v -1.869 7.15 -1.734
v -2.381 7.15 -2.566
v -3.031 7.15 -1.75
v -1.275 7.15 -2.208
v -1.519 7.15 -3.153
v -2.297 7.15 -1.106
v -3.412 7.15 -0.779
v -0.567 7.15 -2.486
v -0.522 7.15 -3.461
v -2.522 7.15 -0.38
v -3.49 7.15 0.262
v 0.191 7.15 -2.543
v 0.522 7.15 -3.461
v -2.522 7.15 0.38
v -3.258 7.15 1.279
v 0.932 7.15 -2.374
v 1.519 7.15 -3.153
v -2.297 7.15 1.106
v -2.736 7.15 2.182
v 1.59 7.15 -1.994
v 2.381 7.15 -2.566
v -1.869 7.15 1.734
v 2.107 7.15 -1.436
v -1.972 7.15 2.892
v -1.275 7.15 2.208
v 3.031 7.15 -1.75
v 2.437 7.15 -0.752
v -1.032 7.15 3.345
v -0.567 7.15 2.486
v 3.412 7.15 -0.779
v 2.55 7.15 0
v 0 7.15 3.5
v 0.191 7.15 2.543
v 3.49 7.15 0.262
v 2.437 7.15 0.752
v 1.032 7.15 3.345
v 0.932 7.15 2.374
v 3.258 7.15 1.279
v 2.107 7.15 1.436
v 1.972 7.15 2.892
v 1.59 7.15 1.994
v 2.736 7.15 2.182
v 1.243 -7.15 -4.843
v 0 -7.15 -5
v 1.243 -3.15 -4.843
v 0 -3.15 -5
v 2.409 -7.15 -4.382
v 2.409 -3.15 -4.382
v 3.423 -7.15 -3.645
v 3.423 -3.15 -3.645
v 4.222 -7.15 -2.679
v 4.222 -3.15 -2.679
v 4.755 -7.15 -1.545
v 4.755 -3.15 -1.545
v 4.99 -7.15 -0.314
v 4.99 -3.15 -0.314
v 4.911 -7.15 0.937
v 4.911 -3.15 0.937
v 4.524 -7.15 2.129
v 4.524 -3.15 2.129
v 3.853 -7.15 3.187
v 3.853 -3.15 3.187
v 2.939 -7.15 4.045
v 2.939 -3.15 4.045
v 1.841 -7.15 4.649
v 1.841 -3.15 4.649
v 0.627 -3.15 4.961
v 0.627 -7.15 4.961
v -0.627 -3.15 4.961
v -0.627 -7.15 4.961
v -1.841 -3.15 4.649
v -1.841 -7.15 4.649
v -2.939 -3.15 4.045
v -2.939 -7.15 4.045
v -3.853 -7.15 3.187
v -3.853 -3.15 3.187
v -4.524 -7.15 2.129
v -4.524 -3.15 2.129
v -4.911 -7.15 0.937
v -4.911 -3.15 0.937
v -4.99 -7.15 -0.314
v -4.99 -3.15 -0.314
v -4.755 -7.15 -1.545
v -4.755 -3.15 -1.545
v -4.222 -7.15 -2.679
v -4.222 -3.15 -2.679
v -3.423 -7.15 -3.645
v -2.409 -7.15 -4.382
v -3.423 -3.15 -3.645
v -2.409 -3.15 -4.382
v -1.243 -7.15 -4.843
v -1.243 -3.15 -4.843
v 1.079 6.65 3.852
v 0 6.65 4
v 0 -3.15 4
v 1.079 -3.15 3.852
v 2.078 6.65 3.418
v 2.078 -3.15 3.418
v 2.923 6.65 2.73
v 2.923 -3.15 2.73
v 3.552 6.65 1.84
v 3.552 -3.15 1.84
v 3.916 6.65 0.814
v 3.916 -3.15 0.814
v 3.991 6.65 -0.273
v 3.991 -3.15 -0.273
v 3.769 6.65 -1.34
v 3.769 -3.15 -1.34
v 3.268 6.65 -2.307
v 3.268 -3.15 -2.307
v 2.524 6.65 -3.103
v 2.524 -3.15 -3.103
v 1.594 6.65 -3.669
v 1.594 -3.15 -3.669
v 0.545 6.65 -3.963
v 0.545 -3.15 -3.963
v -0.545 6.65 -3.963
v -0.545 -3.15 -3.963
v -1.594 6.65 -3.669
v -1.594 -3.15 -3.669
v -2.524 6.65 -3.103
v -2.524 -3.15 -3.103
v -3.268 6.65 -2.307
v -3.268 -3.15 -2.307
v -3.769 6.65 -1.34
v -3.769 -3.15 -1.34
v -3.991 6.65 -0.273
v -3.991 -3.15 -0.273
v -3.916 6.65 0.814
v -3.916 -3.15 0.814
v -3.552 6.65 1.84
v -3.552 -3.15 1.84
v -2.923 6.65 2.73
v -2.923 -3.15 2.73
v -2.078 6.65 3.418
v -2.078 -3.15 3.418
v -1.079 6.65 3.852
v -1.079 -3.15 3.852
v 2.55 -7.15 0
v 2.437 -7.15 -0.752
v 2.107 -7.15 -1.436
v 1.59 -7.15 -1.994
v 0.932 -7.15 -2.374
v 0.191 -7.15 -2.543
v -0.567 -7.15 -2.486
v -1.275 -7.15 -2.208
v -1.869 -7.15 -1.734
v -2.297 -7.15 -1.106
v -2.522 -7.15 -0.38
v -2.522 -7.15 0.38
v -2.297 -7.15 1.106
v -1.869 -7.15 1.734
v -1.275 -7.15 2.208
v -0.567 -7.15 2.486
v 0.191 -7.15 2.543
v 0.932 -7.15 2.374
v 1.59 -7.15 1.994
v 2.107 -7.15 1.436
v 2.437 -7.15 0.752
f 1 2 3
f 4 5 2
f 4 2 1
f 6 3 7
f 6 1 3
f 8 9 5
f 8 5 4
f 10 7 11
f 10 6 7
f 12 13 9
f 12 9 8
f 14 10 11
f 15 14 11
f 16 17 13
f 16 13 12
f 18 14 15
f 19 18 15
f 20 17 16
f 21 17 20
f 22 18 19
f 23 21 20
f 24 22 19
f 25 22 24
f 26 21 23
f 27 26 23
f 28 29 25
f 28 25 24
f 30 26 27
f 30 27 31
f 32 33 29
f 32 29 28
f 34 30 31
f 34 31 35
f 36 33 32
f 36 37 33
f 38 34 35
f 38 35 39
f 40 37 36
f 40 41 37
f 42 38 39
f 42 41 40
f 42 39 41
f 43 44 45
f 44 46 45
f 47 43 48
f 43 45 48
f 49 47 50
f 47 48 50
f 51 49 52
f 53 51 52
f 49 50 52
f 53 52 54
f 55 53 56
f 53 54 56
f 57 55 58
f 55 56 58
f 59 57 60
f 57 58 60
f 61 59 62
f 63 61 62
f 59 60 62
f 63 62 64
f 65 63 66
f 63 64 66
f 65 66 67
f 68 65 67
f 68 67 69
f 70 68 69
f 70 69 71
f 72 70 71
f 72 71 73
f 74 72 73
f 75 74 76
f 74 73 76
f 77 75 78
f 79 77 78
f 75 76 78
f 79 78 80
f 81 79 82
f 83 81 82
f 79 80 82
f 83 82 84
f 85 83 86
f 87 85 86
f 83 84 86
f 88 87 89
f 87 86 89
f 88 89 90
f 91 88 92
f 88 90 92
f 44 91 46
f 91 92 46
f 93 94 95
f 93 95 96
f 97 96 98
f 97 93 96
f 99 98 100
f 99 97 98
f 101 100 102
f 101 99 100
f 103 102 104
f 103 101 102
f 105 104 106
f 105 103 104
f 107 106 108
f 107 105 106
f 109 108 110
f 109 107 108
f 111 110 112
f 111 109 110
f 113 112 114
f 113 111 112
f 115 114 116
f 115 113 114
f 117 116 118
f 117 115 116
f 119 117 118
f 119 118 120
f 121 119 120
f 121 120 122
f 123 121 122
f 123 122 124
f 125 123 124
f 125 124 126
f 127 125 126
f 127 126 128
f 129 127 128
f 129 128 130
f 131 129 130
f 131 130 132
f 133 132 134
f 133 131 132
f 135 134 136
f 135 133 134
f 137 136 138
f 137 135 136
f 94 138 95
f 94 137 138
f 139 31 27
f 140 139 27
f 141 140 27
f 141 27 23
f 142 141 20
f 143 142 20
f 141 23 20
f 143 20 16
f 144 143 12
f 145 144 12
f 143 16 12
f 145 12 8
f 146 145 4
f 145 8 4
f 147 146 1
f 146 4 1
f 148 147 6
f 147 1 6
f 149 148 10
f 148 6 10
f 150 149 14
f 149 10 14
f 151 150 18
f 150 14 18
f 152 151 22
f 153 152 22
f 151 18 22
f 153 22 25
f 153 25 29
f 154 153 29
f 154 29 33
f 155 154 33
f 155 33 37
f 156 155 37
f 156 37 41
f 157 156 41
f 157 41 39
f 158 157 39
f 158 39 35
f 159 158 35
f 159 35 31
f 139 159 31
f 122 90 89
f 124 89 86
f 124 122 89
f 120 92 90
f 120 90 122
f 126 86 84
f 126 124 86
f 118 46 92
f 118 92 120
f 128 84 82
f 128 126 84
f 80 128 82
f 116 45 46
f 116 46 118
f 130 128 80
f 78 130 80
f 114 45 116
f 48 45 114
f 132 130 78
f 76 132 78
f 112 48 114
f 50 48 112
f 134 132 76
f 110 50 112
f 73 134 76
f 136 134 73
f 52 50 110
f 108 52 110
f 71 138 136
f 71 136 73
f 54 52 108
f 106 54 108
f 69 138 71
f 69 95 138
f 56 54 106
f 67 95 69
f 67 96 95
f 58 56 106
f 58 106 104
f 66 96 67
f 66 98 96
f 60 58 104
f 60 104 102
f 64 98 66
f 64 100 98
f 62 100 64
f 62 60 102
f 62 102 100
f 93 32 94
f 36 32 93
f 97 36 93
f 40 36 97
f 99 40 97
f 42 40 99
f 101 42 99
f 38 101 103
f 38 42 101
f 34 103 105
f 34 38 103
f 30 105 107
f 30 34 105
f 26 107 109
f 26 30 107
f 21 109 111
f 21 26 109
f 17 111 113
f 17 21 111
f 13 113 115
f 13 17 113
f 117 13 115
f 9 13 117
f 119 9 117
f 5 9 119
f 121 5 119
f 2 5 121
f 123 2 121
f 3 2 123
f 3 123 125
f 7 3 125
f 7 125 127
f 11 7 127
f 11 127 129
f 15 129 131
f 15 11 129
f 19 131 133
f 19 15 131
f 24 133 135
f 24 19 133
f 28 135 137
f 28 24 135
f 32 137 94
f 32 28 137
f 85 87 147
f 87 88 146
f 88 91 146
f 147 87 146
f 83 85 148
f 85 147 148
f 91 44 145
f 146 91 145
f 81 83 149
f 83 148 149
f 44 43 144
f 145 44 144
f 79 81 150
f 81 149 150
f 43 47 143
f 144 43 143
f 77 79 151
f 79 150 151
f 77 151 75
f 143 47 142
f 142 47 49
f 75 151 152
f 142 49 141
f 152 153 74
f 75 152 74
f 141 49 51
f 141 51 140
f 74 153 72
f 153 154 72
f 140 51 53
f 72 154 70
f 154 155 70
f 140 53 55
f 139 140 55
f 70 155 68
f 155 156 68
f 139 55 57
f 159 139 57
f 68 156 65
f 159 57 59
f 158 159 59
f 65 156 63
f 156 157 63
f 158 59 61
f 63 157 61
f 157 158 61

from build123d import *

# Parameters (mm, degrees)
SKETCH_1_R              = 4
EXTRUDE_1_DEPTH         = 7.15
SKETCH_2_W              = 1
SKETCH_2_H              = 4
CHAMFER_1_SIZE          = 0.5
HOLE_WIZARD_5_1_5_1_1_D = 5.1


with BuildPart() as part:
    # 草图1 → 凸台-拉伸1 (new, symmetric)
    with BuildSketch(Plane(origin=(0, 0, 0), x_dir=(1, 0, 0), z_dir=(0, 1, 0))):
        with Locations(Location((0, 0, 0), (0, 0, 270))):
            Circle(SKETCH_1_R)
    extrude(amount=EXTRUDE_1_DEPTH, both=True)

    # 草图2 → 旋转1 (revolve)
    with BuildSketch(Plane.XY, mode=Mode.PRIVATE) as revolve_1_sk:
        with Locations((4.5, -5.15)):
            Rectangle(SKETCH_2_W, SKETCH_2_H)
    revolve(revolve_1_sk.sketch.rotate(Axis((0, 7.15, 0), (0, -1, 0)), 270), axis=Axis((0, 7.15, 0), (0, -1, 0)))

    # 倒角1
    chamfer_1_edges = [part.edges().sort_by_distance(p)[0] for p in [
        (0, 7.15, -4),
    ]]
    chamfer(chamfer_1_edges, length=CHAMFER_1_SIZE)

    # Ø5.1 (5.1) 直径孔1 (through all)
    with Locations(Plane(origin=(0, -7.15, 0), x_dir=(-1, 0, 0), z_dir=(0, -1, 0))):
        with Locations((0, 0)):
            Hole(HOLE_WIZARD_5_1_5_1_1_D / 2)


solid = part.part
